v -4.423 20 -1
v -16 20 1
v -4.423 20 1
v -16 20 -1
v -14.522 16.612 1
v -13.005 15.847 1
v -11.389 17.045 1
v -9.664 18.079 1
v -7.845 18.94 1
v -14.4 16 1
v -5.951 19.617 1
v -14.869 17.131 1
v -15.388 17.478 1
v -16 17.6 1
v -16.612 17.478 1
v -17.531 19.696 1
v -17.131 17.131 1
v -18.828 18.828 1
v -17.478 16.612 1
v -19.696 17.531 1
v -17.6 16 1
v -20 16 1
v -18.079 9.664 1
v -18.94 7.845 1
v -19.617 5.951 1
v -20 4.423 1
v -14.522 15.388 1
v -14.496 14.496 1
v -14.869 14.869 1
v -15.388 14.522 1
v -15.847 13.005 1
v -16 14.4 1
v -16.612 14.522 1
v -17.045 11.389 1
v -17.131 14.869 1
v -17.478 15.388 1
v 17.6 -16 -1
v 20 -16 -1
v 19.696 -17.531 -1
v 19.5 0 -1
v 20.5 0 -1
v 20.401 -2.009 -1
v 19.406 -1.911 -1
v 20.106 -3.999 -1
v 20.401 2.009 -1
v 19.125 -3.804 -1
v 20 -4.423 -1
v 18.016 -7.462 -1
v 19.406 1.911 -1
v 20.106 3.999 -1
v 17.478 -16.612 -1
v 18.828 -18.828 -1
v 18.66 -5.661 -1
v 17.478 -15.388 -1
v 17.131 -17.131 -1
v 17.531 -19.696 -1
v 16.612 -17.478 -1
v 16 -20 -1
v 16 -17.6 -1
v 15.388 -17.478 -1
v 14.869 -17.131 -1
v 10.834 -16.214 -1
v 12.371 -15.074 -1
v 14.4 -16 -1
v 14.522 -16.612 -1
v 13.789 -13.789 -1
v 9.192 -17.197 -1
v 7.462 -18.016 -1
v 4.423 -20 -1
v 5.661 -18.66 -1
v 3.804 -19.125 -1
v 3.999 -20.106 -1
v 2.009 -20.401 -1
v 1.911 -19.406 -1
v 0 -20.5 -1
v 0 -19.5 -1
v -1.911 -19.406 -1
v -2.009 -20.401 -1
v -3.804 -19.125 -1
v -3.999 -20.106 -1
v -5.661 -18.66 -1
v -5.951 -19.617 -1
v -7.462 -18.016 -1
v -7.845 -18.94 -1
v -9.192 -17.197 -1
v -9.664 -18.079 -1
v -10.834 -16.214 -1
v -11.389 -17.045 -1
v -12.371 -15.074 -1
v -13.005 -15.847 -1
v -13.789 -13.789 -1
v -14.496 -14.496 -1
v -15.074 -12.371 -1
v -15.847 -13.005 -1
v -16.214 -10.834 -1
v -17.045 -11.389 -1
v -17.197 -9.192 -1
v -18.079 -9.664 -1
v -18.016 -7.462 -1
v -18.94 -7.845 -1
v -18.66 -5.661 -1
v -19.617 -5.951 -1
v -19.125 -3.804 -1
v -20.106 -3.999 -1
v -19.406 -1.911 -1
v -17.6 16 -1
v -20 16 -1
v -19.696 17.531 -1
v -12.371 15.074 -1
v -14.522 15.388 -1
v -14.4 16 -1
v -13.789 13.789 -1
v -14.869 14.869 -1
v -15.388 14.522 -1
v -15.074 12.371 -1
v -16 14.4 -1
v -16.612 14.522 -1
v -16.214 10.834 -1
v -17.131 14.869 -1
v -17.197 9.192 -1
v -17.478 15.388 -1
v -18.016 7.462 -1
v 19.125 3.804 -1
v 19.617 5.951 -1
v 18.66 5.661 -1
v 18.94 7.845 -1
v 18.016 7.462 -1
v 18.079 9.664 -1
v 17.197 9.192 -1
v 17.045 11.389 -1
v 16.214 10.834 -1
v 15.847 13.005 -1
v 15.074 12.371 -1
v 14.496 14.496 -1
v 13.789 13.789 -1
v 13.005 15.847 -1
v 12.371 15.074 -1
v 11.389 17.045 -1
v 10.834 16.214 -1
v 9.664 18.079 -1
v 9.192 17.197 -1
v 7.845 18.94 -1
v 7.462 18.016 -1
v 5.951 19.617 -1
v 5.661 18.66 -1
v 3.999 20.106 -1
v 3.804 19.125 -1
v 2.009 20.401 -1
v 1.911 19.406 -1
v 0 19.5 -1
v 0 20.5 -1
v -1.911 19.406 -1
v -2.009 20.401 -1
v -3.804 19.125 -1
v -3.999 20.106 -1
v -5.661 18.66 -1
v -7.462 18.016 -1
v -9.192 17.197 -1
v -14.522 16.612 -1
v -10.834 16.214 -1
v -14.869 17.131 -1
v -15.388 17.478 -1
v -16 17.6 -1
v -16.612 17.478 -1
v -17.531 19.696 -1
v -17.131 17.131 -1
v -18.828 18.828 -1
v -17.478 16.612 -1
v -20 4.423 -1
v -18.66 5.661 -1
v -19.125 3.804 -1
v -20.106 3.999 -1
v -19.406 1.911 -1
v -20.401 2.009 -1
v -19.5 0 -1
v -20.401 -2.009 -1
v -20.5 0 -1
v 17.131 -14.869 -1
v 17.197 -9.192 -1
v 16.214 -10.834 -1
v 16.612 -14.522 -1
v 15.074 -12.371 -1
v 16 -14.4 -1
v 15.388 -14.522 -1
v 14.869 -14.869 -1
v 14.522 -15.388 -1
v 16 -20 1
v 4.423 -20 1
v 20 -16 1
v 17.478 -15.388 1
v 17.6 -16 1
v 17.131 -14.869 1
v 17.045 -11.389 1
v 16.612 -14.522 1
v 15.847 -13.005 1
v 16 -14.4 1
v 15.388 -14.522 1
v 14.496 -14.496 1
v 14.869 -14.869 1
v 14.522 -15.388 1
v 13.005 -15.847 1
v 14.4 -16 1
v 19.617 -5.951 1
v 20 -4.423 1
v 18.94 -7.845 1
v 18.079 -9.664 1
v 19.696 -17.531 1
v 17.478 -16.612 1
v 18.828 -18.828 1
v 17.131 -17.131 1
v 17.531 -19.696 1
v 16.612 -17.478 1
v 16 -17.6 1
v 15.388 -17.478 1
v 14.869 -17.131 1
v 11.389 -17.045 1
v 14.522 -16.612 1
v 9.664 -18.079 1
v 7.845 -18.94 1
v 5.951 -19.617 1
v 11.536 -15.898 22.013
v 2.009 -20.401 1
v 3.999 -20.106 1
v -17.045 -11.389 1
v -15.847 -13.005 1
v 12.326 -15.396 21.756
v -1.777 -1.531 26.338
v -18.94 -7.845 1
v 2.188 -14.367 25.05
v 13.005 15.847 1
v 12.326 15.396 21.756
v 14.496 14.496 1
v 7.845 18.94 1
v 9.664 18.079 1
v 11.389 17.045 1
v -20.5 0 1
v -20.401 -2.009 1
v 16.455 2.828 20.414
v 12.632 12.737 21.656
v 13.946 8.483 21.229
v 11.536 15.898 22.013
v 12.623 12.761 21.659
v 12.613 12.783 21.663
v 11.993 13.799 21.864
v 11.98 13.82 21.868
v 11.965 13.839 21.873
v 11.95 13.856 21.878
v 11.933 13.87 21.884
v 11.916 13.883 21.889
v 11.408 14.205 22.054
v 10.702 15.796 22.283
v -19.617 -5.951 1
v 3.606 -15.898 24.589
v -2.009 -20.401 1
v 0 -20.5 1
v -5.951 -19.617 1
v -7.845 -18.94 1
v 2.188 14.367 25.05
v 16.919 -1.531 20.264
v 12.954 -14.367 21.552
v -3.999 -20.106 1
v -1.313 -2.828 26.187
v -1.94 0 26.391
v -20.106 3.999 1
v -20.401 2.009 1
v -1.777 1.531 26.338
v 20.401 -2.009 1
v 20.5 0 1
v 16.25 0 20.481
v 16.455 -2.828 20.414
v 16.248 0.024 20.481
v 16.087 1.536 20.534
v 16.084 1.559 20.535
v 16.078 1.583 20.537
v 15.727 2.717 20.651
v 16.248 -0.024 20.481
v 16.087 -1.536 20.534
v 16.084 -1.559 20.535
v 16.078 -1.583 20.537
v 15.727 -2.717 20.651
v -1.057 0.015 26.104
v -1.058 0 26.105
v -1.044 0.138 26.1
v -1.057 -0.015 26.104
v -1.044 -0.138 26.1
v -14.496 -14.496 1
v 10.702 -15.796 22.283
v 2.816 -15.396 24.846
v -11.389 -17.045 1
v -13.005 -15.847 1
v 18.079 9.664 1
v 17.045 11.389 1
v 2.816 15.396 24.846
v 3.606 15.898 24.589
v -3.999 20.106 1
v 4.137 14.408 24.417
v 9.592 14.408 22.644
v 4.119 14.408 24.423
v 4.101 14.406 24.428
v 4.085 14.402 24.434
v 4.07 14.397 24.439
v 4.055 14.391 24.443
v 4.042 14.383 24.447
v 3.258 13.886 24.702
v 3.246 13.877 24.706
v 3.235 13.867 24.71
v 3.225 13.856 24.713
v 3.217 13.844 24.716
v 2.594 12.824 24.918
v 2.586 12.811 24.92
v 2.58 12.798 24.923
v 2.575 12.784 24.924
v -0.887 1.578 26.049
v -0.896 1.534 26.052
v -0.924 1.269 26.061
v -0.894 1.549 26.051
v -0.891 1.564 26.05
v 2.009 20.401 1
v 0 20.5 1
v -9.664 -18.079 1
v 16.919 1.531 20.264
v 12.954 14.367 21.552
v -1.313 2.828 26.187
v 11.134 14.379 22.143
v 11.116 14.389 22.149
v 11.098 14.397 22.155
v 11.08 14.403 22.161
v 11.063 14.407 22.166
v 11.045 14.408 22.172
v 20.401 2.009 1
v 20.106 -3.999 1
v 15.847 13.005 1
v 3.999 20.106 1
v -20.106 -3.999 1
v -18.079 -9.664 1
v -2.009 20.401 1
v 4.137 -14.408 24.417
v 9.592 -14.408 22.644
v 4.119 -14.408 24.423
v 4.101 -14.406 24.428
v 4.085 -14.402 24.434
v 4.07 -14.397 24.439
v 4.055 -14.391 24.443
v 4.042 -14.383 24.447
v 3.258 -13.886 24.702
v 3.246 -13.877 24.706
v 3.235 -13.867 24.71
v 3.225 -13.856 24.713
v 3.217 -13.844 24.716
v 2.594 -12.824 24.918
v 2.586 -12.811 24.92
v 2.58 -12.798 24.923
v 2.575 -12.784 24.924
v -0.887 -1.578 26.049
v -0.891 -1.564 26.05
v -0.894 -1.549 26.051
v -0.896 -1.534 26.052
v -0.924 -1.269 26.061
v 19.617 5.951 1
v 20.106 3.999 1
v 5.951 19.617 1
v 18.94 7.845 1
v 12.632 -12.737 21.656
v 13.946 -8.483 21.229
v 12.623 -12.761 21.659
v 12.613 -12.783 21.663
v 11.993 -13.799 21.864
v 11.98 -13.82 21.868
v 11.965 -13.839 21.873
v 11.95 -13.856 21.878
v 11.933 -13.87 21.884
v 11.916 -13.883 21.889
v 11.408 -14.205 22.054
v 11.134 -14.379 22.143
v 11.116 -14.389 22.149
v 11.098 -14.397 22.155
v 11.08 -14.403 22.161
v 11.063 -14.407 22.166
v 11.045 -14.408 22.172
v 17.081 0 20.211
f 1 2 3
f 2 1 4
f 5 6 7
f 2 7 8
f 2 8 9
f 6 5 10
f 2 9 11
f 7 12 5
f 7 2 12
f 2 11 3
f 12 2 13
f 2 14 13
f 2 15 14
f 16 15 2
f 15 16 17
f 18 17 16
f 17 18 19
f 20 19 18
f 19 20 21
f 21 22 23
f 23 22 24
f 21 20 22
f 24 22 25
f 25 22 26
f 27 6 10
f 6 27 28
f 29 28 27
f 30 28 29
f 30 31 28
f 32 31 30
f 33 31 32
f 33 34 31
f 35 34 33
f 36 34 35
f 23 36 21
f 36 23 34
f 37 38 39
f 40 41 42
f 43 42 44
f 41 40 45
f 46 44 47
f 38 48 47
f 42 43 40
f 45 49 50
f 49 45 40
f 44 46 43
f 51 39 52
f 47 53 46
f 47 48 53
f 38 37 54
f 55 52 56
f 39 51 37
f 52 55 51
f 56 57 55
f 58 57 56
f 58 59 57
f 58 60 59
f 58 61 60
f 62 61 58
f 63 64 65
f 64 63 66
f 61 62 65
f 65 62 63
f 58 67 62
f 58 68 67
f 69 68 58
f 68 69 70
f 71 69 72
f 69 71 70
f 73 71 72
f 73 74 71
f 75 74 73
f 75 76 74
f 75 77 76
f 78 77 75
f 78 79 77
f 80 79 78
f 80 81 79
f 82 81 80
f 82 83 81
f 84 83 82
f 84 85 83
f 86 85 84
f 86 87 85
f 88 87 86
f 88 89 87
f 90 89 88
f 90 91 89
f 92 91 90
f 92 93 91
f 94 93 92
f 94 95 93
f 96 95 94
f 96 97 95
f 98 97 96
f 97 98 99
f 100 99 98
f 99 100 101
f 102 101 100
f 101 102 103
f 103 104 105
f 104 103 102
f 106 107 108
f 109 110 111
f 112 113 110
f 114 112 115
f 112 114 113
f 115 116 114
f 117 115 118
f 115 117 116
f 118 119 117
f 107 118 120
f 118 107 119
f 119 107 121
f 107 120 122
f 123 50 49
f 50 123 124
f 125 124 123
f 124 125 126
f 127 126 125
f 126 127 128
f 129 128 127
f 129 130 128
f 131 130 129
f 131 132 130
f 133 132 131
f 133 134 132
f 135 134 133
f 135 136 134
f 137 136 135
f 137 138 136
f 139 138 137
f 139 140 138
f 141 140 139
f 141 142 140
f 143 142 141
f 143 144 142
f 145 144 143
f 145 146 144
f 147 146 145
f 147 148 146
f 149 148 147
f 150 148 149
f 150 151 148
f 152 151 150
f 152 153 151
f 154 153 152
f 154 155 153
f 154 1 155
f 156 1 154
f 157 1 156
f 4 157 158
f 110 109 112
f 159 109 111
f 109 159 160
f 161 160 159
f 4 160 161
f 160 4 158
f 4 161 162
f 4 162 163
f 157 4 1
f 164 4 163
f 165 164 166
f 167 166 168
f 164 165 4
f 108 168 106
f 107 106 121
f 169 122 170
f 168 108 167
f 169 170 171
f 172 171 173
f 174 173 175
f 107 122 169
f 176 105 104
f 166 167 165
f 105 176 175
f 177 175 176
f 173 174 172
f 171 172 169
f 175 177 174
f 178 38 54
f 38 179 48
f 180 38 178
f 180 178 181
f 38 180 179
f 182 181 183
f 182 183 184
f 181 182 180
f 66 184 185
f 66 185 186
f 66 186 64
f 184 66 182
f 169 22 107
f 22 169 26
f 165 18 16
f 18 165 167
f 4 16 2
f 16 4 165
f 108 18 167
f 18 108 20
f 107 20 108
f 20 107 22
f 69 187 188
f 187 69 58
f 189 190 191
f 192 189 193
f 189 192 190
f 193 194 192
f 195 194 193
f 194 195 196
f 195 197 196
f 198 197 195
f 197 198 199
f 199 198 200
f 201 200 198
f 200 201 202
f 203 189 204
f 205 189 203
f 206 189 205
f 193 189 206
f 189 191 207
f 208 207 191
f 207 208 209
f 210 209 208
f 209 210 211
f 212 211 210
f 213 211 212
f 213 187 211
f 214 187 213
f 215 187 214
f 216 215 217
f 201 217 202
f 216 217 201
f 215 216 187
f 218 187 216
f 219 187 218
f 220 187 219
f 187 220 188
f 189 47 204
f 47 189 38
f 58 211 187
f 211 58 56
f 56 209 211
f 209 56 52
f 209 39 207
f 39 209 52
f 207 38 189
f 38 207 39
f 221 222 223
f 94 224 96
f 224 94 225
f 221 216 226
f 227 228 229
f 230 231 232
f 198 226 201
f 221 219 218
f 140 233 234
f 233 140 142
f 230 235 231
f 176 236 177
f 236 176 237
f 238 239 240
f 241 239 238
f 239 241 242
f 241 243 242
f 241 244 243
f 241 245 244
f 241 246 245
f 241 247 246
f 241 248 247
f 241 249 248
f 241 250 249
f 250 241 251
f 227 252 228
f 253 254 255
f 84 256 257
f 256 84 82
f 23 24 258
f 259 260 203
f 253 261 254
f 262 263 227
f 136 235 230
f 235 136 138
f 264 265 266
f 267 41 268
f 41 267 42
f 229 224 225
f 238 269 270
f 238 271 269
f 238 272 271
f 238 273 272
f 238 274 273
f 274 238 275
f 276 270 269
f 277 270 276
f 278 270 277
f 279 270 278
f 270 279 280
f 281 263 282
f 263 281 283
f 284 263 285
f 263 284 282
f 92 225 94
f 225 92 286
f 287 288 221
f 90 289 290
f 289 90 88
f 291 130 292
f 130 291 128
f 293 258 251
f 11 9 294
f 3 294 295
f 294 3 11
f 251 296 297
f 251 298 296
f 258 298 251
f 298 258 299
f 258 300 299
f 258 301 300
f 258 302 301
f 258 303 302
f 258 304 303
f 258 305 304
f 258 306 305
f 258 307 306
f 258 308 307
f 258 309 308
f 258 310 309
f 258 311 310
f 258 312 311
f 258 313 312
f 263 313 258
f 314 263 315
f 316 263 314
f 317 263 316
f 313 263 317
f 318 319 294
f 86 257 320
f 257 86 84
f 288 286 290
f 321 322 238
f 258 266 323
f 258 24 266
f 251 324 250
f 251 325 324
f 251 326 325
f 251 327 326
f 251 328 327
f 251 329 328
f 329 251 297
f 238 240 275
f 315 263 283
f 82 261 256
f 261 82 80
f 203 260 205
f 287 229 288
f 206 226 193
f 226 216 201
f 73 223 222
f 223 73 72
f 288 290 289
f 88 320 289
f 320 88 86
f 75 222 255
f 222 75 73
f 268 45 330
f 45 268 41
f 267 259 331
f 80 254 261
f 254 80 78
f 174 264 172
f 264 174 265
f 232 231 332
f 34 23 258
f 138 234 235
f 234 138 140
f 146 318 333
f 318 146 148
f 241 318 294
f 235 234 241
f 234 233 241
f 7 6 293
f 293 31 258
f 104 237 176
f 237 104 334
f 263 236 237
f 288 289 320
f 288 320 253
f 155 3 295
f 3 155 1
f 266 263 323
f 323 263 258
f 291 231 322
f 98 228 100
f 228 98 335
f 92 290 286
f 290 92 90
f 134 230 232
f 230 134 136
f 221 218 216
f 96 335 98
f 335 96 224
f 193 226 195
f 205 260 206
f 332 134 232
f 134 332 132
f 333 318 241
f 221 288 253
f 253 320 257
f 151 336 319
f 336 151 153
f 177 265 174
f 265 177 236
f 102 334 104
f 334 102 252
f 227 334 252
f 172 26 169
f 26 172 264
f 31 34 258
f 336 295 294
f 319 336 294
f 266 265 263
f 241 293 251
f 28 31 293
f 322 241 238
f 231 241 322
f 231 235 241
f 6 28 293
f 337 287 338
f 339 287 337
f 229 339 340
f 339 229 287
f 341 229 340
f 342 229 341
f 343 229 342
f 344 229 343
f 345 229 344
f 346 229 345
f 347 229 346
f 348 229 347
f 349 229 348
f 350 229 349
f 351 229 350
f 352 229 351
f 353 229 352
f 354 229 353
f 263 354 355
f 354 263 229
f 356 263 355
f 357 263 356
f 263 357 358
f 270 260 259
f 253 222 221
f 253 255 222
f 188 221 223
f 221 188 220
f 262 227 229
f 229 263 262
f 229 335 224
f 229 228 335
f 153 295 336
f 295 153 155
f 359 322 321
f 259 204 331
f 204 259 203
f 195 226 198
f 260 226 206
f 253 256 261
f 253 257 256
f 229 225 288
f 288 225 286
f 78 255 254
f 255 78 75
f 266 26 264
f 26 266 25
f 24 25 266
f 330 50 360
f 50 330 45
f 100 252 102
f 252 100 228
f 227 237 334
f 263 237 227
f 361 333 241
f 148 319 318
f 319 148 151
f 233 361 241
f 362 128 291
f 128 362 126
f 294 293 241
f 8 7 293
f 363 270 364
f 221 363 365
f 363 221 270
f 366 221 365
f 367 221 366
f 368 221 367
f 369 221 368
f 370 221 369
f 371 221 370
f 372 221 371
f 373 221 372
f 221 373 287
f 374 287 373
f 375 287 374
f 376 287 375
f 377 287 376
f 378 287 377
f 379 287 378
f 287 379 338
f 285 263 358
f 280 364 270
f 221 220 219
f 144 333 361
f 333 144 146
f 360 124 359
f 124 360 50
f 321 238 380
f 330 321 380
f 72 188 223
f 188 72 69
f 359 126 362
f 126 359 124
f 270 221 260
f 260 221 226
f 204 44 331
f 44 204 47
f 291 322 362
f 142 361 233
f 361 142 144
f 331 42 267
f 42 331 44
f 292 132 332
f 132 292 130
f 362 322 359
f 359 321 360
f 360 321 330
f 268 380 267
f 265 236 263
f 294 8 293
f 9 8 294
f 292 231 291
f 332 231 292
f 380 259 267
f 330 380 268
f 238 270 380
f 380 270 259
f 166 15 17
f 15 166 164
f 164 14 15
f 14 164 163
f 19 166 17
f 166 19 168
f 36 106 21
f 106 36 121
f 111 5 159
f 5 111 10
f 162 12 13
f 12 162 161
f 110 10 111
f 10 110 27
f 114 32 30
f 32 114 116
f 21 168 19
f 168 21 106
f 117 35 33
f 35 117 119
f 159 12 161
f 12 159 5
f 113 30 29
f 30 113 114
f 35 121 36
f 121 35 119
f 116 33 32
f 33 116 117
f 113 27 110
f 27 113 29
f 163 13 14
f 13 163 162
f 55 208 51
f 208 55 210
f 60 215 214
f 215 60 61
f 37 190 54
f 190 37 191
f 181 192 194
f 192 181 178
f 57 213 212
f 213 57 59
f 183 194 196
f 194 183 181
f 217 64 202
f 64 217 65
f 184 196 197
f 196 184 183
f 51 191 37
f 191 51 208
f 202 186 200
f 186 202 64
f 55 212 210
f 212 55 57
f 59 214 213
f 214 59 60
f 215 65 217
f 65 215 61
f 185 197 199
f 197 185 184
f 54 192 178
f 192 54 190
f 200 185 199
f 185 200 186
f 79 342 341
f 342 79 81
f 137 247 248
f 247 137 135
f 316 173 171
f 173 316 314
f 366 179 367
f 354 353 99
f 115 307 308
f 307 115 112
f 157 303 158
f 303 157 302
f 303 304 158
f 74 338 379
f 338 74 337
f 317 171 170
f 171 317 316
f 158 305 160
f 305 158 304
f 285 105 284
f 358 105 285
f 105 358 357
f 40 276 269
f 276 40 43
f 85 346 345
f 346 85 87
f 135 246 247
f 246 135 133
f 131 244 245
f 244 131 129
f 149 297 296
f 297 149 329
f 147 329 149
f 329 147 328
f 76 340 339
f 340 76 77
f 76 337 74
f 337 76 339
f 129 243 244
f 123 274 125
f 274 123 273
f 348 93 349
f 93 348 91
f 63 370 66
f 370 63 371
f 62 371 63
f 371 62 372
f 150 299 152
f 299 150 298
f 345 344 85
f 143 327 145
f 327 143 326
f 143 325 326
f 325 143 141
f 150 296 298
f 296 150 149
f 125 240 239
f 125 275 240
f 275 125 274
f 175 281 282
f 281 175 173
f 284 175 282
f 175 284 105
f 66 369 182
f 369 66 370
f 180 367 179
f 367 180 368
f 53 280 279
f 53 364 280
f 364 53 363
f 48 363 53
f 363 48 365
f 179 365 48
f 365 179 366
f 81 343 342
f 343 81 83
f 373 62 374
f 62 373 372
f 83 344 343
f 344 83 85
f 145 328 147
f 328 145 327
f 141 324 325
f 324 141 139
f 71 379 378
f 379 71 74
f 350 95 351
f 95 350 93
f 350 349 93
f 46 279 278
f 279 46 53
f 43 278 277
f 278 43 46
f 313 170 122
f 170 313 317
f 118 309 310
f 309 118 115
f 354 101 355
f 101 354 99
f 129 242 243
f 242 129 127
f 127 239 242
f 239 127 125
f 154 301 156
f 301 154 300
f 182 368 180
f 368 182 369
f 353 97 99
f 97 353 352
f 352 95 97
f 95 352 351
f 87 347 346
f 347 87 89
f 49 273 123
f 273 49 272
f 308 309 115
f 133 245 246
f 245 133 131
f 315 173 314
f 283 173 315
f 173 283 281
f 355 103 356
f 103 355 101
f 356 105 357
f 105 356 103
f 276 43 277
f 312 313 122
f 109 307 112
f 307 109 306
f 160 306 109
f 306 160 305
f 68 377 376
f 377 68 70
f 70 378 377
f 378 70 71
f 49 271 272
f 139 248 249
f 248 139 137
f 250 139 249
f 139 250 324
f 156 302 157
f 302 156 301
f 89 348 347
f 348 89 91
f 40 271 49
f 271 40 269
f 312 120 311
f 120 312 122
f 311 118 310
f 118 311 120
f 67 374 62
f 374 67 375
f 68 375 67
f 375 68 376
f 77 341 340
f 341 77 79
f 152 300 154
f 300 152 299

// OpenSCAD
// [FL_INDEX: keywords="openscad, 3d_parametric, Customizable_fan_nozzle_for_40mm_fans, csg_solid" | COT="Parametric OpenSCAD design from 3DCodeverse"]
// Title: Customizable fan nozzle for 40mm fans


nozzle_edges = 6;
nozzle_edgeradius = 3;
nozzle_edgerotate = false;
nozzle_length = 24;
nozzle_dillation = 24;
nozzle_wall = 1;
nozzle_scale = 0.75;
nozzle_tilt = 18;

mntholes_numberof = 2;
mntholes_angles = [ 90, 270, 0, 180 ];

$fn = 64;

module nozzle_shape( r, h )
{
	if ( nozzle_edges < 20 && nozzle_edgeradius > 0 )
		for ( a = [0:nozzle_edges] )
			rotate( [ 0, 0, 360/nozzle_edges * a ] )
				translate( [ r- nozzle_edgeradius, 0, 0 ] )
					cylinder( r = nozzle_edgeradius, h = h, center = true, $fn = 16 );
	else
		cylinder( r = r, h = h, center = true, $fn = nozzle_edges );
}

difference()
{
	union()
	{
		for ( a = [1:mntholes_numberof] )
			rotate( [ 0, 0, mntholes_angles[a-1] ] )
			{
				translate( [ 10, 8, 0 ] )
					cube( [ 20, 16, 2 ], center = true );
				translate( [ 8, 10, 0 ] )
					cube( [ 16, 20, 2 ], center = true );
				translate( [ 16, 16, 0 ] )
					cylinder( r = 4, h = 2, center = true, $fn = 16 );
			}

		hull()
		{
			cylinder( r = 20.5, h = 2, center = true );
			rotate( [ 0, nozzle_tilt, 0 ] )
			translate( [ 0, 0, nozzle_length ] )
				scale( [ nozzle_scale, 1 / nozzle_scale, 1 ] )
					rotate( [ 0, 0, nozzle_edgerotate ? 180 / nozzle_edges : 0 ] )
						nozzle_shape( r = nozzle_dillation/2+nozzle_wall*max(nozzle_scale,1/nozzle_scale), h = 1 );
		}
	}

	for ( a = [1:mntholes_numberof] )
		rotate( [ 0, 0, mntholes_angles[a-1] ] )
			translate( [ 16, 16, 0 ] )
				cylinder( r = 1.6, h = 5, center = true, $fn = 16 );

	hull()
	{
		translate( [ 0, 0, -1.5 ] )
		cylinder( r = 20.5 - nozzle_wall, h = 1, center = true );
			rotate( [ 0, nozzle_tilt, 0 ] )
		translate( [ 0, 0, nozzle_length ] )
			//cylinder( r = nozzle_dillation * cos( 180 / nozzle_edges )/2, h = 1.5, center = true );
			scale( [ nozzle_scale, 1 / nozzle_scale, 1 ] )
				rotate( [ 0, 0, nozzle_edgerotate ? 180 / nozzle_edges : 0 ] )
					nozzle_shape( r = nozzle_dillation/2, h = 1.5 );
	}
}
